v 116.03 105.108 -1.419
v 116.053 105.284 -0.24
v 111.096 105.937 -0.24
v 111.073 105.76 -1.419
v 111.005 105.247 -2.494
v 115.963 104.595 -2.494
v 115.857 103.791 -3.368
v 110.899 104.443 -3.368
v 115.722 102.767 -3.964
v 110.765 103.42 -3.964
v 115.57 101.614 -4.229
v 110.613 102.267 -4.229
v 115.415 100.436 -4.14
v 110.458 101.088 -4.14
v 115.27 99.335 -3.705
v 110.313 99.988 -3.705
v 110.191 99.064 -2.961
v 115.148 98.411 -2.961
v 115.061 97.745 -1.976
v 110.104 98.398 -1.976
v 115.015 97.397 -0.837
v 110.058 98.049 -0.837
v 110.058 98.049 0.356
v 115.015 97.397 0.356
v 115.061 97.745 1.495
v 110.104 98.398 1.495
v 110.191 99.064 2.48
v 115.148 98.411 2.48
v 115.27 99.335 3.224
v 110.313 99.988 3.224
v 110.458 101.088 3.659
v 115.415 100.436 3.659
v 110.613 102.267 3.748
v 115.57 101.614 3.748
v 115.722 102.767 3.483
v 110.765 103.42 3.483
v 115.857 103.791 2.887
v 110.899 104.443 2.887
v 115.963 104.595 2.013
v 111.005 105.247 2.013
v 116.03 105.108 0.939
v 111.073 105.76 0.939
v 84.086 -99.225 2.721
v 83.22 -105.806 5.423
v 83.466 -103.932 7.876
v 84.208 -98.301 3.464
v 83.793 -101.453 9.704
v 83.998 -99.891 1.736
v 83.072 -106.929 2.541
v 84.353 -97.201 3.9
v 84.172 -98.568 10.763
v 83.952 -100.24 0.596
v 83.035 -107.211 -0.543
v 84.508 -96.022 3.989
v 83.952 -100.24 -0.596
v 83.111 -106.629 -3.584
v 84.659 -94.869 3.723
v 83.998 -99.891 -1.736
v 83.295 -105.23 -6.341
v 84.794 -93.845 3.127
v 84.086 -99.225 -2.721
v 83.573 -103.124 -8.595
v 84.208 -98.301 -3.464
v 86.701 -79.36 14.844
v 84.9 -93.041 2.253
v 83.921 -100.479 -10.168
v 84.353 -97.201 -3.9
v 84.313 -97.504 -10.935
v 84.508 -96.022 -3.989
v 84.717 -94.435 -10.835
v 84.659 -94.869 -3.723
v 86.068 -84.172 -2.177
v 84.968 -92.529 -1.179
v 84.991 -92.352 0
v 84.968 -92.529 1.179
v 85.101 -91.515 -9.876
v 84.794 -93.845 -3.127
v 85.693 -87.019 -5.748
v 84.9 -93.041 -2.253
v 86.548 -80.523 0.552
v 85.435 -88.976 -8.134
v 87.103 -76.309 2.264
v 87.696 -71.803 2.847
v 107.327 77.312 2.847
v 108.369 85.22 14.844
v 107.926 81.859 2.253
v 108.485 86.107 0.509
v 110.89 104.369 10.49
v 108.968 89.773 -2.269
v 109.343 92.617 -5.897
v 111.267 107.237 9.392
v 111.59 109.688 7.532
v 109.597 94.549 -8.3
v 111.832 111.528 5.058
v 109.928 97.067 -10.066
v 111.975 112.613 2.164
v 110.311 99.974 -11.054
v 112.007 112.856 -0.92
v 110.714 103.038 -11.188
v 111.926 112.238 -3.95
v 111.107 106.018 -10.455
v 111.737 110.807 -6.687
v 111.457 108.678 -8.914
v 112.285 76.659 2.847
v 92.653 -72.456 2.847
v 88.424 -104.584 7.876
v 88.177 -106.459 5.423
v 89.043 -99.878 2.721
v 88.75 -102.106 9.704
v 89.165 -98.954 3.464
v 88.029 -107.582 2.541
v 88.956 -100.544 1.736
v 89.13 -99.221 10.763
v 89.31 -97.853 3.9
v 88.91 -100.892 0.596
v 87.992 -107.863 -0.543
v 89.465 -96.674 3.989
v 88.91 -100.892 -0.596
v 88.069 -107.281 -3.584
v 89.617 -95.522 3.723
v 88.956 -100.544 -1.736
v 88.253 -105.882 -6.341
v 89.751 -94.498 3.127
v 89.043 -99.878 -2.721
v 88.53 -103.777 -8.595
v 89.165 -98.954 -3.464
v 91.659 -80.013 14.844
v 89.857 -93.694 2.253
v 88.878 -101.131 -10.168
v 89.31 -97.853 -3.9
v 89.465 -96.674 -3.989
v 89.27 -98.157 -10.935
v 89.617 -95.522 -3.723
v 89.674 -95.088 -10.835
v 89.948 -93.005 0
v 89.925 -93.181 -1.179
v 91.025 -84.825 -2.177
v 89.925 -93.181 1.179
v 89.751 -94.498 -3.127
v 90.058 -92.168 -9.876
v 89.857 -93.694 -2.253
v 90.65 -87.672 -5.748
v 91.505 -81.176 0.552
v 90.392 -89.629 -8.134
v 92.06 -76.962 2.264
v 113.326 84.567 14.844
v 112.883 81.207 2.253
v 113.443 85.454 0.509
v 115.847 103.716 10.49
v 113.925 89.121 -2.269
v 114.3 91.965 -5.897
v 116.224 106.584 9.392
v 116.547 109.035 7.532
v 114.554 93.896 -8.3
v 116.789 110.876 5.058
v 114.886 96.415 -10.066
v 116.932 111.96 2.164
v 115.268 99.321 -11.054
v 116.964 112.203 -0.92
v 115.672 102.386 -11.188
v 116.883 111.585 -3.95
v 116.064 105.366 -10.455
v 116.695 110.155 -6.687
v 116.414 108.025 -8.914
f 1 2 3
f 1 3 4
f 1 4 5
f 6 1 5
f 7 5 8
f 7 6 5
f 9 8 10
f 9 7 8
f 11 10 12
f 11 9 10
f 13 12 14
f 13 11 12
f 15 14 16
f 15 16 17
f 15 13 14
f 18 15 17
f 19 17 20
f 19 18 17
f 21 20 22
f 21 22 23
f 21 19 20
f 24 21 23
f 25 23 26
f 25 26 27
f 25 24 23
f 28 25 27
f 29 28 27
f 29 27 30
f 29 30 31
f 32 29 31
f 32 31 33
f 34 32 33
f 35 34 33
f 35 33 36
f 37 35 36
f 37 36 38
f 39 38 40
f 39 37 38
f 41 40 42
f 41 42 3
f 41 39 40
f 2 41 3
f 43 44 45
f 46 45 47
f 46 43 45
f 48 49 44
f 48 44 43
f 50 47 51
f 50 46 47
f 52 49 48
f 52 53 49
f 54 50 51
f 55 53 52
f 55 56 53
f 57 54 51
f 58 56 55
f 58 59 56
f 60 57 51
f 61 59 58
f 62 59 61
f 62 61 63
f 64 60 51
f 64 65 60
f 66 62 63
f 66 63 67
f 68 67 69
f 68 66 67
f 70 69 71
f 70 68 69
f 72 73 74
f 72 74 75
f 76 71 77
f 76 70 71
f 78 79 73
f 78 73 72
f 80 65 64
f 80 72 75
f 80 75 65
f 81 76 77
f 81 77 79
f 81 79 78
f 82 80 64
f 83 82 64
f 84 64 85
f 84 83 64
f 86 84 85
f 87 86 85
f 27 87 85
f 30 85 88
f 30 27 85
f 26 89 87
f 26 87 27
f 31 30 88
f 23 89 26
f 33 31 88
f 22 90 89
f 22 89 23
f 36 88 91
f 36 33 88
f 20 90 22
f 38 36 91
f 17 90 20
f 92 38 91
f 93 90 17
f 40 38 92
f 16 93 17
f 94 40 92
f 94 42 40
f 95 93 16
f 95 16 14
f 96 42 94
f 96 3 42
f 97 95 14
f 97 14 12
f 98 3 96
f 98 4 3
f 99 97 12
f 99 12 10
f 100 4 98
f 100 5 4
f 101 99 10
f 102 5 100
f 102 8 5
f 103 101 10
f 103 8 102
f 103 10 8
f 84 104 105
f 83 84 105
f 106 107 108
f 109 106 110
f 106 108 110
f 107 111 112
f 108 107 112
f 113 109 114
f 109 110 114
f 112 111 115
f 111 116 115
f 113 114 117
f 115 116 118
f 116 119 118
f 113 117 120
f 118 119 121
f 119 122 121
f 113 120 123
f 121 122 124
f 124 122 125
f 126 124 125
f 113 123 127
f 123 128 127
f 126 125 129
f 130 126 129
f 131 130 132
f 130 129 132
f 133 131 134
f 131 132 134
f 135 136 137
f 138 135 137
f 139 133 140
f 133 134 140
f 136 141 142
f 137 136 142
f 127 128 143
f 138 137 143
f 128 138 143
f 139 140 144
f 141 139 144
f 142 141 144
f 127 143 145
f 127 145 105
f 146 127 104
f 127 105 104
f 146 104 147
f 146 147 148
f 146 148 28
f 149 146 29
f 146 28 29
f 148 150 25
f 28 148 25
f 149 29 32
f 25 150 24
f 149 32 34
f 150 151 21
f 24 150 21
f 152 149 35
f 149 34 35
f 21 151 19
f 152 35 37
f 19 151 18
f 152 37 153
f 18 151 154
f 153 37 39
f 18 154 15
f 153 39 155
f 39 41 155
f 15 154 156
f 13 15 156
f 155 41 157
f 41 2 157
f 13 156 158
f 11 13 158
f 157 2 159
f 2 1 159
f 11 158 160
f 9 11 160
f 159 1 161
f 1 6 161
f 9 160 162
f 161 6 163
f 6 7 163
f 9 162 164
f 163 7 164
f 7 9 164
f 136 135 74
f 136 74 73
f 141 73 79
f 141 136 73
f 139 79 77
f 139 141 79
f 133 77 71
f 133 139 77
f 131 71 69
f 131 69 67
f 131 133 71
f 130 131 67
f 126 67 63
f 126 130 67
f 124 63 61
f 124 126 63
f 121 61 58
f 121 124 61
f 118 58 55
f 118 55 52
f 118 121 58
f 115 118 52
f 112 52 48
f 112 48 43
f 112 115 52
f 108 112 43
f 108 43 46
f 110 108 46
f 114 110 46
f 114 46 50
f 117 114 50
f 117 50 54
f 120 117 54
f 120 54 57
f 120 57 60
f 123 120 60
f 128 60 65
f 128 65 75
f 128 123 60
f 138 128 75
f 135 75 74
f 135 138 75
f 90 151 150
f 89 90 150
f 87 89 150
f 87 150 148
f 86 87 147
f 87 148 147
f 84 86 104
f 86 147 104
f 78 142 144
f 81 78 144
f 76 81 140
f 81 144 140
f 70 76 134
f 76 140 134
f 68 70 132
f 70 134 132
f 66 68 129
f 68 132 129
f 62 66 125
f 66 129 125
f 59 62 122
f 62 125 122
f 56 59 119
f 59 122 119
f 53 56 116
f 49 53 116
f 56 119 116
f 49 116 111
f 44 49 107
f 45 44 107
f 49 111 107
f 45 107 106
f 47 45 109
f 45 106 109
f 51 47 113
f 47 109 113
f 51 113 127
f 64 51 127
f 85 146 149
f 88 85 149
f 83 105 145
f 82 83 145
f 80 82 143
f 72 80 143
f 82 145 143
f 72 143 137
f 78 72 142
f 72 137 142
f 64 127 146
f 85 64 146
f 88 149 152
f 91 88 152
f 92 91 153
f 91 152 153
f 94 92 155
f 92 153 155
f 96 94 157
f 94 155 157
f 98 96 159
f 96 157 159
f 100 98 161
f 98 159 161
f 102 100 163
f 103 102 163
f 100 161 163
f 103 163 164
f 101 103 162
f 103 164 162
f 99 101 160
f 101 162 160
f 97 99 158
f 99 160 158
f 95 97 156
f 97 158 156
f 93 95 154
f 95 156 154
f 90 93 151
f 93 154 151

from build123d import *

# Parameters (mm, degrees)
SKETCH1_R             = 4
BOSS_EXTRUDE1_DEPTH   = 5
BODY_MOVE_COPY1_ANGLE = 82.5


with BuildPart() as part:
    # Sketch1 → Boss-Extrude1 (new body)
    with BuildSketch(Plane(origin=(0, 0, 0), x_dir=(1, 0, 0), z_dir=(0, 1, 0))):
        with BuildLine():
            Line((17.104515265, -14.844249905), (183.104515265, -14.844249905))
            Line((183.104515265, -14.844249905), (202.418839623, -10.490300594))
            ThreePointArc((202.418839623, -10.490300594), (208.912700196, 6.687224641), (190.565681892, 5.896960314))
            ThreePointArc((190.565681892, 5.896960314), (183.998945909, -0.509119996), (175.127942725, -2.846894344))
            Line((175.127942725, -2.846894344), (24.726164692, -2.84688969))
            ThreePointArc((24.726164692, -2.84688969), (15.931189962, -0.551933774), (9.378890583, 5.747730981))
            ThreePointArc((9.378890583, 5.747730981), (-8.988354121, 6.341095346), (-2.269343204, -10.763367569))
            Line((-2.269343204, -10.763367569), (17.104515265, -14.844249905))
        make_face()
        Circle(SKETCH1_R, mode=Mode.SUBTRACT)
        with Locations((199.999855487, 0.240427049)):
            Circle(SKETCH1_R, mode=Mode.SUBTRACT)
    extrude(amount=BOSS_EXTRUDE1_DEPTH)


with BuildPart() as part_1:
    # Body-Move/Copy1: moved
    add(part.part.rotate(Axis((99.999927744, 2.5, 0), (0, 0, 1)), BODY_MOVE_COPY1_ANGLE))


solid = part_1.part
